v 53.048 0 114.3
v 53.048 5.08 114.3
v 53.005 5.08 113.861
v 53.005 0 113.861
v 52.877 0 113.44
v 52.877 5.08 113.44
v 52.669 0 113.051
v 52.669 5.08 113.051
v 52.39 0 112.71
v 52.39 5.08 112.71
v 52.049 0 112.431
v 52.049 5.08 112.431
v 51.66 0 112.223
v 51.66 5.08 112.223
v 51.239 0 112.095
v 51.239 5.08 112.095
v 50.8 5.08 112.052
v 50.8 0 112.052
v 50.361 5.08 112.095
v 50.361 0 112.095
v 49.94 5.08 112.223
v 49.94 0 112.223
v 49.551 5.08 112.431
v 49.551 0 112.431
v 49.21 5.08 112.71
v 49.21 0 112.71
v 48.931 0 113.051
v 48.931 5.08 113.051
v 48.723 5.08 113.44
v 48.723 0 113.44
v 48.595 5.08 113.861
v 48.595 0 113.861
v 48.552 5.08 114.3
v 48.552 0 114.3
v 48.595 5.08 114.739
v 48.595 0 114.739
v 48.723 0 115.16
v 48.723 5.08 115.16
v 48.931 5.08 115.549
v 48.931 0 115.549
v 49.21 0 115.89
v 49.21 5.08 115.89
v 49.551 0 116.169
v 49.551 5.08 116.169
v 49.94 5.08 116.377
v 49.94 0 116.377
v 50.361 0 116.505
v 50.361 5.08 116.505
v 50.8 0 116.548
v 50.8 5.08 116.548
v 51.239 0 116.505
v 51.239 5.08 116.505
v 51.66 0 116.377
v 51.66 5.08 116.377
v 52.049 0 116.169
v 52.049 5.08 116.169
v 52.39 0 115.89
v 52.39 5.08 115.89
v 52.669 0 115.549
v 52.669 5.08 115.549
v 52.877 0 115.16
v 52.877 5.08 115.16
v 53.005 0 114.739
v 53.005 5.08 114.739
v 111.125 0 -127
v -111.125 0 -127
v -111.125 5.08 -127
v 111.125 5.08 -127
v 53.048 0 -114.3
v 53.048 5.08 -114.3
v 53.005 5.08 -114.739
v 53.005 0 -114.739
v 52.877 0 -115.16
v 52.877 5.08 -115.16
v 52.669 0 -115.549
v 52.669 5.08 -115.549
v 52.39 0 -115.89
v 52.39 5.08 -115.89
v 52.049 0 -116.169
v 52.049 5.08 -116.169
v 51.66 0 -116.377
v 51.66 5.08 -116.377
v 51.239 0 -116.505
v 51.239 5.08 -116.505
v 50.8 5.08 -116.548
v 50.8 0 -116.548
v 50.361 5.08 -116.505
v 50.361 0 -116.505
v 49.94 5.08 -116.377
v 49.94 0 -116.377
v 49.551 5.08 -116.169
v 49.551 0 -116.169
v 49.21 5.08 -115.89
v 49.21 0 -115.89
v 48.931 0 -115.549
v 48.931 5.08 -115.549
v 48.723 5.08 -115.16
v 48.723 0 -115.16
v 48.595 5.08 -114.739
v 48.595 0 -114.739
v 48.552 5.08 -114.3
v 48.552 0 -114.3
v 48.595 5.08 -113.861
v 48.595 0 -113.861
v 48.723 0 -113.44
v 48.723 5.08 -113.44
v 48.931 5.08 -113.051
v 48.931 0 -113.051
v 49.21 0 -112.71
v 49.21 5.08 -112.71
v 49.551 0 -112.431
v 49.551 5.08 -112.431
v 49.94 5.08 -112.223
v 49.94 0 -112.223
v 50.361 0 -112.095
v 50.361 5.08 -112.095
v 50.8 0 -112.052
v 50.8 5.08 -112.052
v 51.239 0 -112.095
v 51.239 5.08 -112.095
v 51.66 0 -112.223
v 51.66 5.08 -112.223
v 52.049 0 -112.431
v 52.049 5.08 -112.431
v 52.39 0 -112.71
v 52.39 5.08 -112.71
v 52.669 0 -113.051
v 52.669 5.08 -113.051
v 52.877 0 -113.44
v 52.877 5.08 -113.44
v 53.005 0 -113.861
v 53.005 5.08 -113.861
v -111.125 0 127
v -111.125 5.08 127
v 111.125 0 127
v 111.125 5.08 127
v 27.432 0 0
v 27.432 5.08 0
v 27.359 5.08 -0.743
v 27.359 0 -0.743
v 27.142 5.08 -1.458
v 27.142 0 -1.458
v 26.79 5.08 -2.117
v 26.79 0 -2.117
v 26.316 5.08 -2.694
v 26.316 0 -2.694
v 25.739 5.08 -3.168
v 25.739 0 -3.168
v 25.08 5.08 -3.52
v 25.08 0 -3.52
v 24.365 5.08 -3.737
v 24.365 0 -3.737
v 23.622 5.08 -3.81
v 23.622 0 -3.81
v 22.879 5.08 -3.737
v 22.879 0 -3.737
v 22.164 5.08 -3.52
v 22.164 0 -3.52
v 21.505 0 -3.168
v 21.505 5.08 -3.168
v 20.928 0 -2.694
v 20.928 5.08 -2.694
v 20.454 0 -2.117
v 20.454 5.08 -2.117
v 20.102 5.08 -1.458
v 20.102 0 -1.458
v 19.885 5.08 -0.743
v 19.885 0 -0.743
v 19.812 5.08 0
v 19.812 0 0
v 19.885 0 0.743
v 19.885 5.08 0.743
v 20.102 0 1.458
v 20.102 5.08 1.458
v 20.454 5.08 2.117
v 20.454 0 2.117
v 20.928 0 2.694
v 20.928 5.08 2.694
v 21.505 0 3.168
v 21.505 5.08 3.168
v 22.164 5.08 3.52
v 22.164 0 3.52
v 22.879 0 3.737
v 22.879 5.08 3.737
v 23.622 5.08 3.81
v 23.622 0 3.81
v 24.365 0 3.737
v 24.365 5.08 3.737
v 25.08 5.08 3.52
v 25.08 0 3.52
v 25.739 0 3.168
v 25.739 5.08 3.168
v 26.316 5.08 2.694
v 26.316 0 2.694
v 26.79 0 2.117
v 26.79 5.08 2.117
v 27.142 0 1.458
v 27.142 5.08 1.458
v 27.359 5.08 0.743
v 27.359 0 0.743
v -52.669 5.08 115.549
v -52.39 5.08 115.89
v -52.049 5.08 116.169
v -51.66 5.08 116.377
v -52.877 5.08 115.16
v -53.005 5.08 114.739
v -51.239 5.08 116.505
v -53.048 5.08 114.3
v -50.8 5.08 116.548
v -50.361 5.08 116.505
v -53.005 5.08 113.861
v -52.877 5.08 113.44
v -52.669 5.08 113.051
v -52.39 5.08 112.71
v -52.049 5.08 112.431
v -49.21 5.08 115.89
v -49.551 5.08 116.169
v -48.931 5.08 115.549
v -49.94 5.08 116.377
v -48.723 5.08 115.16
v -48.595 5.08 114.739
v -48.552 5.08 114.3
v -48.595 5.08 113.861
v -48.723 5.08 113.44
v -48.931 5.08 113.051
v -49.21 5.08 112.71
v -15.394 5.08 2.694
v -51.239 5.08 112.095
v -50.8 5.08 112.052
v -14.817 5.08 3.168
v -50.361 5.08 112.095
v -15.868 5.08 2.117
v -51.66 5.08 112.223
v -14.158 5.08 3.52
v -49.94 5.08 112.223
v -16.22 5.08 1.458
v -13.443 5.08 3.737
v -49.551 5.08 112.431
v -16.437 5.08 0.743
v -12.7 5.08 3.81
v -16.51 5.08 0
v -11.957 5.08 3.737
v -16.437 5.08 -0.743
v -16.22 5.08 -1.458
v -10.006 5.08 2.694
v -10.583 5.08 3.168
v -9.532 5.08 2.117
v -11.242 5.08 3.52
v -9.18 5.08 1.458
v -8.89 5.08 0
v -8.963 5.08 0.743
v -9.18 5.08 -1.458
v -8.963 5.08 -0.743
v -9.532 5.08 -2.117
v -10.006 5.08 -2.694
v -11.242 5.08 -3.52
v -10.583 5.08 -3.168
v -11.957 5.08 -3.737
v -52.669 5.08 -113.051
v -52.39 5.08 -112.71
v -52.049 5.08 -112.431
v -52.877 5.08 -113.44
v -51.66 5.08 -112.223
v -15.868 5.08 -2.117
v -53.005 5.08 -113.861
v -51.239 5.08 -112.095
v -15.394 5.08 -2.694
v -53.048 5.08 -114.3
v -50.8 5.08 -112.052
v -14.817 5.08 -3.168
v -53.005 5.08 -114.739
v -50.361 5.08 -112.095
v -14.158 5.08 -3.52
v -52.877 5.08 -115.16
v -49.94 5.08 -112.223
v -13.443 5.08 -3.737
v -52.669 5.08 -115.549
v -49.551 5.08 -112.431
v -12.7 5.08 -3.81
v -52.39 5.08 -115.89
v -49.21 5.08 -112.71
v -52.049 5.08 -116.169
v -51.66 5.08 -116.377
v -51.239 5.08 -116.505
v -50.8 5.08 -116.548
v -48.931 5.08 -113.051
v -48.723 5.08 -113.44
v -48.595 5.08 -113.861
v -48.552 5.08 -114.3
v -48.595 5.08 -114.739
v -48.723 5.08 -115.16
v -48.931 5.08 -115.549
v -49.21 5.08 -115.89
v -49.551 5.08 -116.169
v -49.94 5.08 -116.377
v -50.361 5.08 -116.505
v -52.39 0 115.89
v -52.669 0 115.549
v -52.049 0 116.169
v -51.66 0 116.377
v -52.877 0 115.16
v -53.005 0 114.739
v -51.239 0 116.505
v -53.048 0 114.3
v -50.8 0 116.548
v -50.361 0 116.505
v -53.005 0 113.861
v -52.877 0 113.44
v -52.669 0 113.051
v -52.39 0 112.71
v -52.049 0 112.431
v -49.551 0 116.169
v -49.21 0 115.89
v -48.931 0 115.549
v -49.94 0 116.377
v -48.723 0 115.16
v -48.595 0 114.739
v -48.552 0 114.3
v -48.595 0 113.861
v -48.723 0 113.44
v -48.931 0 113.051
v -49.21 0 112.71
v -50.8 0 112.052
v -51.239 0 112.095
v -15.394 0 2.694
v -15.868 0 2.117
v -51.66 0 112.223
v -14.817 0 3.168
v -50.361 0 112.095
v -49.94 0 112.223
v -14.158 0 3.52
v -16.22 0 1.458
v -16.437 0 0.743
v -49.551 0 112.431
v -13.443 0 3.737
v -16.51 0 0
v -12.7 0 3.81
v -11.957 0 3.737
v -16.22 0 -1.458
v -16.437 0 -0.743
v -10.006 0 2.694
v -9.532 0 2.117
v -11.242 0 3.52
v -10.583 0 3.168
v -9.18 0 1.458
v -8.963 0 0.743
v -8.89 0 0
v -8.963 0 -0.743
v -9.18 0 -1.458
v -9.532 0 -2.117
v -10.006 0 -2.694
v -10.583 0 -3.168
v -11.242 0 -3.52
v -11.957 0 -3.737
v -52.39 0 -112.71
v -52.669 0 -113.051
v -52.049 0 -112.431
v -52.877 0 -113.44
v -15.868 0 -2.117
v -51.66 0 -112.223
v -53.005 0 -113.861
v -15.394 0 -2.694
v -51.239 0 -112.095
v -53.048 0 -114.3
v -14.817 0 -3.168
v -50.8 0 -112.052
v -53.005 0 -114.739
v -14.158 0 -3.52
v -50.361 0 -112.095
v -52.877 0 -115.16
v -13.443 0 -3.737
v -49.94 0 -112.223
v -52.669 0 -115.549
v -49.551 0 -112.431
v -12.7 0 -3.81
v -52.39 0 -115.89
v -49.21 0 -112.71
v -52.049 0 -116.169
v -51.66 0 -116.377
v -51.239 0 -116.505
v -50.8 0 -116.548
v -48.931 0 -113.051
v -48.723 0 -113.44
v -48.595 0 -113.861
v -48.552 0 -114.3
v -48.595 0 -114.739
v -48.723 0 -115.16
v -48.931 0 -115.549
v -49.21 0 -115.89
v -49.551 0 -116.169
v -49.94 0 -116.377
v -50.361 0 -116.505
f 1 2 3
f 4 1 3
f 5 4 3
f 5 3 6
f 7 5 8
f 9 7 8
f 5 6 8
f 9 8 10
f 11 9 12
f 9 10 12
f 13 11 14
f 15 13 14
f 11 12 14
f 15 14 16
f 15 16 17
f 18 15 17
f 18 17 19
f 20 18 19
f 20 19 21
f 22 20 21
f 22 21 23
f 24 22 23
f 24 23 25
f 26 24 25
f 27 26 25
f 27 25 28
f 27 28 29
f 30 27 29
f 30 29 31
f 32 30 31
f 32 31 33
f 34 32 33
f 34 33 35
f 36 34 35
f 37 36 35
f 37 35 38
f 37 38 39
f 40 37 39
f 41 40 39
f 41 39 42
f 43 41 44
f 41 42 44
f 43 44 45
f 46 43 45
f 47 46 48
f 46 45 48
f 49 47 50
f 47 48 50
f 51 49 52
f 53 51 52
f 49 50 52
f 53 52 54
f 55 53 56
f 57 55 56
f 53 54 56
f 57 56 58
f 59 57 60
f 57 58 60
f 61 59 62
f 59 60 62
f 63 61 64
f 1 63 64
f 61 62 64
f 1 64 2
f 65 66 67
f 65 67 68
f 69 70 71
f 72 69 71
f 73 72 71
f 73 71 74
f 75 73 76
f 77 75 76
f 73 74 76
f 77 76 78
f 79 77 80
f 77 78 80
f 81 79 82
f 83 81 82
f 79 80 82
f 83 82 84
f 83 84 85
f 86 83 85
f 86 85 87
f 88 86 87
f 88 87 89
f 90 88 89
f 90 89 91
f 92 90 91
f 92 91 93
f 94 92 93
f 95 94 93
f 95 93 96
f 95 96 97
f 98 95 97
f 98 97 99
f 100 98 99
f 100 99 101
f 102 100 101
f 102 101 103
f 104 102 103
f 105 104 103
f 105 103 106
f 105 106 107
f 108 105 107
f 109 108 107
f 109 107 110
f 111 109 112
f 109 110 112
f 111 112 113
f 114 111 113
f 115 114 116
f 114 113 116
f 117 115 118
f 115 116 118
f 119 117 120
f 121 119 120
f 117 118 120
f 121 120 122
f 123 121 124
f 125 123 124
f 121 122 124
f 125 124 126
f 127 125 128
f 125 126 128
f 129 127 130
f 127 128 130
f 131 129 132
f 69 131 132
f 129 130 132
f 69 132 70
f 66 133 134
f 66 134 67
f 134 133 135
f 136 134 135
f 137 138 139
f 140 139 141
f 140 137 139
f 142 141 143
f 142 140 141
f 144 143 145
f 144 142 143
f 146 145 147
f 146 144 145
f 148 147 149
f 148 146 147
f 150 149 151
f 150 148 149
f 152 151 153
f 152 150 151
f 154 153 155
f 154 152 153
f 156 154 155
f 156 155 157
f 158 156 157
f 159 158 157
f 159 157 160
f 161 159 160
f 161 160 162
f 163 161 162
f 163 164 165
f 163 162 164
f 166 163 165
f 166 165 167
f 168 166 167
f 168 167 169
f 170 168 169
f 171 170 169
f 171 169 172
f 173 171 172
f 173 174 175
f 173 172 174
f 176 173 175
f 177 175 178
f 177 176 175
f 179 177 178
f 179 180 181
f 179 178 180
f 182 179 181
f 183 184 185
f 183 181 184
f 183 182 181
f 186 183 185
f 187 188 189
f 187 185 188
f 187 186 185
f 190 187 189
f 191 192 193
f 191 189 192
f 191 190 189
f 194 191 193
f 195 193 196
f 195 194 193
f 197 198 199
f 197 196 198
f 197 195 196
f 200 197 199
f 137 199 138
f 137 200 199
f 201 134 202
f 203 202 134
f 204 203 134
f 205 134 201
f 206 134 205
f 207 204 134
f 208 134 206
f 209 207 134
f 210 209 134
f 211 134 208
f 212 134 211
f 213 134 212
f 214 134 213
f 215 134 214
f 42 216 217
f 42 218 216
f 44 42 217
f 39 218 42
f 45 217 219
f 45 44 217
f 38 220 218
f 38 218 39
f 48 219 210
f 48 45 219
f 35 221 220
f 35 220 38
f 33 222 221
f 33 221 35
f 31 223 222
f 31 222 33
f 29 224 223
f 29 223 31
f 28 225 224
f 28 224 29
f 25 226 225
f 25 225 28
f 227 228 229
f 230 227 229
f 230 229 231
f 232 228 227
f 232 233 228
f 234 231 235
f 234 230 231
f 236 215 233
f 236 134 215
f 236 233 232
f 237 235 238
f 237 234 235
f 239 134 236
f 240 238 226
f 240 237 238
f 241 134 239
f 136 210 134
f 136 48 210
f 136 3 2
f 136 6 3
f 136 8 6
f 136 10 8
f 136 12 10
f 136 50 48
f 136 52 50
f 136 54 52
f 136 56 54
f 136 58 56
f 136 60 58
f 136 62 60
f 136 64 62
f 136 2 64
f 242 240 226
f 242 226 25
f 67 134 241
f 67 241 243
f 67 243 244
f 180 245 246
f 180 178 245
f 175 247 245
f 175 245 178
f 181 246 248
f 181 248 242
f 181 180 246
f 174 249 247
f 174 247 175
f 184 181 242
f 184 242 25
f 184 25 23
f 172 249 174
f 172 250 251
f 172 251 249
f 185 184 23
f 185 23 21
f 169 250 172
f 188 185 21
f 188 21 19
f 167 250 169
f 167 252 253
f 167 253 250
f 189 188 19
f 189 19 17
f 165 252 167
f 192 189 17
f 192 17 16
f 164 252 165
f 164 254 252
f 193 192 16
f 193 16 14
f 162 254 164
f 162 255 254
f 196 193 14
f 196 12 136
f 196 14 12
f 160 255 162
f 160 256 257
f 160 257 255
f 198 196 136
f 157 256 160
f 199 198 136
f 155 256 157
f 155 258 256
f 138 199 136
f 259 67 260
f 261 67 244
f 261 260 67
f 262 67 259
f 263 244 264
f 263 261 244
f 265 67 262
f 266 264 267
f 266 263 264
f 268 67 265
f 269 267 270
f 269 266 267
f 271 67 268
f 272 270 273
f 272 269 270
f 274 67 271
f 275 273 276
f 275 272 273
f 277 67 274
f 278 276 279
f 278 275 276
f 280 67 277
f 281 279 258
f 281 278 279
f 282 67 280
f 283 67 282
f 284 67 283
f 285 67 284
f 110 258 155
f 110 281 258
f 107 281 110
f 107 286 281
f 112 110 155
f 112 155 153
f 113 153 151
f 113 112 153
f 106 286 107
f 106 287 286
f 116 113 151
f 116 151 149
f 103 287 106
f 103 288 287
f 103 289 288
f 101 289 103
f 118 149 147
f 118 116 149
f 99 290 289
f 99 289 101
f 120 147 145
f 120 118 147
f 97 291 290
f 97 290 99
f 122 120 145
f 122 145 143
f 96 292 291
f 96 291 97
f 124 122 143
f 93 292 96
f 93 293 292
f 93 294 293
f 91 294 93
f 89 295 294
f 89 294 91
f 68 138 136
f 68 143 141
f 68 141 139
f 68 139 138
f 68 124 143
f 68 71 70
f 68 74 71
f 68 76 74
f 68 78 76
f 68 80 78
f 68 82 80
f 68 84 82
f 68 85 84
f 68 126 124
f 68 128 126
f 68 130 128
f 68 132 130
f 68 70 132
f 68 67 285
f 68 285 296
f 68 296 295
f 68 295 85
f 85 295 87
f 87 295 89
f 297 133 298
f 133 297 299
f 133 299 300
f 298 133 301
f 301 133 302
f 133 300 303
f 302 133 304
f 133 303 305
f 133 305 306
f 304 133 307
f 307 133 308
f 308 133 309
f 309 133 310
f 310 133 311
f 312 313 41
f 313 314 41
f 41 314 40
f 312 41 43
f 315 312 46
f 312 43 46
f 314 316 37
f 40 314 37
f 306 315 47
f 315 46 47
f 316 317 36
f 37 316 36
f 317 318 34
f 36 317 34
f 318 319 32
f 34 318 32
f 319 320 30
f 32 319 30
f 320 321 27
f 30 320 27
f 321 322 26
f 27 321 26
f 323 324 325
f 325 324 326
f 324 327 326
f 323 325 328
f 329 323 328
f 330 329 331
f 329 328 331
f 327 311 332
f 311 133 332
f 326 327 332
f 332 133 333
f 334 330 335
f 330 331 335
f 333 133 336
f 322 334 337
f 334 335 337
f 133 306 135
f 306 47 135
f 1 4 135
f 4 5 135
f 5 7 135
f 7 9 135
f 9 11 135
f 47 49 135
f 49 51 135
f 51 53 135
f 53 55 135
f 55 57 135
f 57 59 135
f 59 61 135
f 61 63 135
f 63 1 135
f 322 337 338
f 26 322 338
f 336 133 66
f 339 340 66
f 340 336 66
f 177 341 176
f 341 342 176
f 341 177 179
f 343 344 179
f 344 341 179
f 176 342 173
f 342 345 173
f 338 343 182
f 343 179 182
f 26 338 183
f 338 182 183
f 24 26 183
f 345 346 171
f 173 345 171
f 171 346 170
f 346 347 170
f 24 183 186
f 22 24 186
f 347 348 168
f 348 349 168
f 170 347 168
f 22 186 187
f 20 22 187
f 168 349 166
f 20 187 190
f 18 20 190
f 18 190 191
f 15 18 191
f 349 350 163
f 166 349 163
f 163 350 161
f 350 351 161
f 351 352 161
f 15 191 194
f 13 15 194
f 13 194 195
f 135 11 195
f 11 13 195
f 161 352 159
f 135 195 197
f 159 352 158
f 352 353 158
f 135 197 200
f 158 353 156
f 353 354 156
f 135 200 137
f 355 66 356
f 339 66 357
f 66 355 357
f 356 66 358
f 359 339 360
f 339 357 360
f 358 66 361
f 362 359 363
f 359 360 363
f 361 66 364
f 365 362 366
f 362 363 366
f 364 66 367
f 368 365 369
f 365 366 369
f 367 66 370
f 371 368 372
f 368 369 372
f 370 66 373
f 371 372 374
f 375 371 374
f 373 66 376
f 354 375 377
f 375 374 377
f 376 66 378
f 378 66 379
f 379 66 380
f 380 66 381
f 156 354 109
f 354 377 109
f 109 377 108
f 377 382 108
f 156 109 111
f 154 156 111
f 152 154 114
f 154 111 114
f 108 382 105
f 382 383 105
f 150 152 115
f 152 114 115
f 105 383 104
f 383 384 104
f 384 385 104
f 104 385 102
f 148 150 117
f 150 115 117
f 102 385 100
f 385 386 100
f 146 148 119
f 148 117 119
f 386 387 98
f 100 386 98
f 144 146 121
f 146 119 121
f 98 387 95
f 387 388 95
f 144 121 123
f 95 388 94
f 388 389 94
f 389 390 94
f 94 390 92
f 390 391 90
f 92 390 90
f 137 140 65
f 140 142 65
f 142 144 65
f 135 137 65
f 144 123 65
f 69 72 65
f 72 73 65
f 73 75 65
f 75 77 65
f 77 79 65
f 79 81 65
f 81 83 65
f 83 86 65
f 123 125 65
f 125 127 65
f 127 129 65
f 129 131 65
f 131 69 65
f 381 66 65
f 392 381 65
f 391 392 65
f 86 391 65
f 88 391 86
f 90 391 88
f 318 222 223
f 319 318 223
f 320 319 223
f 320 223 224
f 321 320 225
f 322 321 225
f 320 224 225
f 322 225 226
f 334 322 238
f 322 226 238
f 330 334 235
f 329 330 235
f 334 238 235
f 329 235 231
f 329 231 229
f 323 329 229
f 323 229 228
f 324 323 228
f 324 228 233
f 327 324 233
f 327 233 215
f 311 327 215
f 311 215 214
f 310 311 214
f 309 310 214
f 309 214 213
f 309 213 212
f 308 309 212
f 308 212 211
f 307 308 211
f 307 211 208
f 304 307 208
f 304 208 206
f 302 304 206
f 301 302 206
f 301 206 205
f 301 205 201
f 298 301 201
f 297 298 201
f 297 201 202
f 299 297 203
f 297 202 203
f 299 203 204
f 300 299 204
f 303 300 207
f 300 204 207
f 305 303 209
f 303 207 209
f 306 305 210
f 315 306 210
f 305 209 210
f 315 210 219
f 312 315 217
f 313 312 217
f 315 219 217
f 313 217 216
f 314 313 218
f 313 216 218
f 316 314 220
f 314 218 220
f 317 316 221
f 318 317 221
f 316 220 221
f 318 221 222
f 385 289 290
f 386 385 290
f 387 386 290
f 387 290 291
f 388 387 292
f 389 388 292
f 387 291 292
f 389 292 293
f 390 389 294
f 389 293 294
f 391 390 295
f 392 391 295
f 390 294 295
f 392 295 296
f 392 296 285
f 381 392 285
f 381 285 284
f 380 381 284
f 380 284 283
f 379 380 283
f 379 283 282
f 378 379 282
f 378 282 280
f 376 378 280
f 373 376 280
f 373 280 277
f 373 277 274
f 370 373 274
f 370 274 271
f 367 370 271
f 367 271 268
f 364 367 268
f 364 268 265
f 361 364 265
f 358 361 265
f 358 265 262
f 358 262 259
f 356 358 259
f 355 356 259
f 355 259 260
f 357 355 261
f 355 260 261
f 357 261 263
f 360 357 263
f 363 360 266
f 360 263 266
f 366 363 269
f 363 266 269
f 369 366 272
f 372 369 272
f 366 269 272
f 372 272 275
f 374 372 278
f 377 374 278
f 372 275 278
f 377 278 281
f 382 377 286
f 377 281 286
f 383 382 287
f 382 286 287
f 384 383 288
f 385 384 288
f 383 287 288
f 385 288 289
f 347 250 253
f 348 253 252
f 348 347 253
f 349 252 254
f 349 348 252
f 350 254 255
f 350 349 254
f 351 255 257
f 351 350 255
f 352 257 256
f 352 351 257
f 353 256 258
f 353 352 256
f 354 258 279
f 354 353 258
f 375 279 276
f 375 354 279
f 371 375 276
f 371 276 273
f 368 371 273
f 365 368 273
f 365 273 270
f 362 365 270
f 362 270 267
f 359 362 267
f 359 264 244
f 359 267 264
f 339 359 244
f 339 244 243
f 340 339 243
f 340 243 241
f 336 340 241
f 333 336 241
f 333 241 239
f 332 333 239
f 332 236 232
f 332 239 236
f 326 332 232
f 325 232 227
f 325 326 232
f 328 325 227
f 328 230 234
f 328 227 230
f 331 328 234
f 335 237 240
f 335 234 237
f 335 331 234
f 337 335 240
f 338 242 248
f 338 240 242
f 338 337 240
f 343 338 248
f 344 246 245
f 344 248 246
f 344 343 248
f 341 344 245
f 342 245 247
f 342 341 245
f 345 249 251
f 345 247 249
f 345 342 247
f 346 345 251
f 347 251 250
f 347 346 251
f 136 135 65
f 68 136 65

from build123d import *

# Parameters (mm, degrees)
SKETCH1_W             = 222.25
SKETCH1_H             = 254
BOSS_EXTRUDE1_DEPTH   = 5.08
SKETCH2_R             = 3.81
CUT_EXTRUDE2_DEPTH    = 6.08
F_8_CLEARANCE_HOLE1_D = 4.4958


with BuildPart() as part:
    # Sketch1 → Boss-Extrude1 (new body)
    with BuildSketch(Plane(origin=(0, 0, 0), x_dir=(1, 0, 0), z_dir=(0, 1, 0))):
        Rectangle(SKETCH1_W, SKETCH1_H)
    extrude(amount=BOSS_EXTRUDE1_DEPTH)

    # Sketch2 → Cut-Extrude2 (cut, through all)
    with BuildSketch(Plane(origin=(0, 0, 0), x_dir=(1, 0, 0), z_dir=(0, 1, 0))):
        with Locations((-12.7, 0)):
            Circle(SKETCH2_R)
        with Locations((23.622, 0)):
            Circle(SKETCH2_R)
    extrude(amount=CUT_EXTRUDE2_DEPTH, mode=Mode.SUBTRACT)

    # #8 Clearance Hole1 (through all)
    with Locations(Plane(origin=(0, 0, 0), x_dir=(-1, 0, 0), z_dir=(0, -1, 0))):
        with Locations((50.8, -114.3), (-50.8, -114.3), (-50.8, 114.3), (50.8, 114.3)):
            Hole(F_8_CLEARANCE_HOLE1_D / 2)


solid = part.part
